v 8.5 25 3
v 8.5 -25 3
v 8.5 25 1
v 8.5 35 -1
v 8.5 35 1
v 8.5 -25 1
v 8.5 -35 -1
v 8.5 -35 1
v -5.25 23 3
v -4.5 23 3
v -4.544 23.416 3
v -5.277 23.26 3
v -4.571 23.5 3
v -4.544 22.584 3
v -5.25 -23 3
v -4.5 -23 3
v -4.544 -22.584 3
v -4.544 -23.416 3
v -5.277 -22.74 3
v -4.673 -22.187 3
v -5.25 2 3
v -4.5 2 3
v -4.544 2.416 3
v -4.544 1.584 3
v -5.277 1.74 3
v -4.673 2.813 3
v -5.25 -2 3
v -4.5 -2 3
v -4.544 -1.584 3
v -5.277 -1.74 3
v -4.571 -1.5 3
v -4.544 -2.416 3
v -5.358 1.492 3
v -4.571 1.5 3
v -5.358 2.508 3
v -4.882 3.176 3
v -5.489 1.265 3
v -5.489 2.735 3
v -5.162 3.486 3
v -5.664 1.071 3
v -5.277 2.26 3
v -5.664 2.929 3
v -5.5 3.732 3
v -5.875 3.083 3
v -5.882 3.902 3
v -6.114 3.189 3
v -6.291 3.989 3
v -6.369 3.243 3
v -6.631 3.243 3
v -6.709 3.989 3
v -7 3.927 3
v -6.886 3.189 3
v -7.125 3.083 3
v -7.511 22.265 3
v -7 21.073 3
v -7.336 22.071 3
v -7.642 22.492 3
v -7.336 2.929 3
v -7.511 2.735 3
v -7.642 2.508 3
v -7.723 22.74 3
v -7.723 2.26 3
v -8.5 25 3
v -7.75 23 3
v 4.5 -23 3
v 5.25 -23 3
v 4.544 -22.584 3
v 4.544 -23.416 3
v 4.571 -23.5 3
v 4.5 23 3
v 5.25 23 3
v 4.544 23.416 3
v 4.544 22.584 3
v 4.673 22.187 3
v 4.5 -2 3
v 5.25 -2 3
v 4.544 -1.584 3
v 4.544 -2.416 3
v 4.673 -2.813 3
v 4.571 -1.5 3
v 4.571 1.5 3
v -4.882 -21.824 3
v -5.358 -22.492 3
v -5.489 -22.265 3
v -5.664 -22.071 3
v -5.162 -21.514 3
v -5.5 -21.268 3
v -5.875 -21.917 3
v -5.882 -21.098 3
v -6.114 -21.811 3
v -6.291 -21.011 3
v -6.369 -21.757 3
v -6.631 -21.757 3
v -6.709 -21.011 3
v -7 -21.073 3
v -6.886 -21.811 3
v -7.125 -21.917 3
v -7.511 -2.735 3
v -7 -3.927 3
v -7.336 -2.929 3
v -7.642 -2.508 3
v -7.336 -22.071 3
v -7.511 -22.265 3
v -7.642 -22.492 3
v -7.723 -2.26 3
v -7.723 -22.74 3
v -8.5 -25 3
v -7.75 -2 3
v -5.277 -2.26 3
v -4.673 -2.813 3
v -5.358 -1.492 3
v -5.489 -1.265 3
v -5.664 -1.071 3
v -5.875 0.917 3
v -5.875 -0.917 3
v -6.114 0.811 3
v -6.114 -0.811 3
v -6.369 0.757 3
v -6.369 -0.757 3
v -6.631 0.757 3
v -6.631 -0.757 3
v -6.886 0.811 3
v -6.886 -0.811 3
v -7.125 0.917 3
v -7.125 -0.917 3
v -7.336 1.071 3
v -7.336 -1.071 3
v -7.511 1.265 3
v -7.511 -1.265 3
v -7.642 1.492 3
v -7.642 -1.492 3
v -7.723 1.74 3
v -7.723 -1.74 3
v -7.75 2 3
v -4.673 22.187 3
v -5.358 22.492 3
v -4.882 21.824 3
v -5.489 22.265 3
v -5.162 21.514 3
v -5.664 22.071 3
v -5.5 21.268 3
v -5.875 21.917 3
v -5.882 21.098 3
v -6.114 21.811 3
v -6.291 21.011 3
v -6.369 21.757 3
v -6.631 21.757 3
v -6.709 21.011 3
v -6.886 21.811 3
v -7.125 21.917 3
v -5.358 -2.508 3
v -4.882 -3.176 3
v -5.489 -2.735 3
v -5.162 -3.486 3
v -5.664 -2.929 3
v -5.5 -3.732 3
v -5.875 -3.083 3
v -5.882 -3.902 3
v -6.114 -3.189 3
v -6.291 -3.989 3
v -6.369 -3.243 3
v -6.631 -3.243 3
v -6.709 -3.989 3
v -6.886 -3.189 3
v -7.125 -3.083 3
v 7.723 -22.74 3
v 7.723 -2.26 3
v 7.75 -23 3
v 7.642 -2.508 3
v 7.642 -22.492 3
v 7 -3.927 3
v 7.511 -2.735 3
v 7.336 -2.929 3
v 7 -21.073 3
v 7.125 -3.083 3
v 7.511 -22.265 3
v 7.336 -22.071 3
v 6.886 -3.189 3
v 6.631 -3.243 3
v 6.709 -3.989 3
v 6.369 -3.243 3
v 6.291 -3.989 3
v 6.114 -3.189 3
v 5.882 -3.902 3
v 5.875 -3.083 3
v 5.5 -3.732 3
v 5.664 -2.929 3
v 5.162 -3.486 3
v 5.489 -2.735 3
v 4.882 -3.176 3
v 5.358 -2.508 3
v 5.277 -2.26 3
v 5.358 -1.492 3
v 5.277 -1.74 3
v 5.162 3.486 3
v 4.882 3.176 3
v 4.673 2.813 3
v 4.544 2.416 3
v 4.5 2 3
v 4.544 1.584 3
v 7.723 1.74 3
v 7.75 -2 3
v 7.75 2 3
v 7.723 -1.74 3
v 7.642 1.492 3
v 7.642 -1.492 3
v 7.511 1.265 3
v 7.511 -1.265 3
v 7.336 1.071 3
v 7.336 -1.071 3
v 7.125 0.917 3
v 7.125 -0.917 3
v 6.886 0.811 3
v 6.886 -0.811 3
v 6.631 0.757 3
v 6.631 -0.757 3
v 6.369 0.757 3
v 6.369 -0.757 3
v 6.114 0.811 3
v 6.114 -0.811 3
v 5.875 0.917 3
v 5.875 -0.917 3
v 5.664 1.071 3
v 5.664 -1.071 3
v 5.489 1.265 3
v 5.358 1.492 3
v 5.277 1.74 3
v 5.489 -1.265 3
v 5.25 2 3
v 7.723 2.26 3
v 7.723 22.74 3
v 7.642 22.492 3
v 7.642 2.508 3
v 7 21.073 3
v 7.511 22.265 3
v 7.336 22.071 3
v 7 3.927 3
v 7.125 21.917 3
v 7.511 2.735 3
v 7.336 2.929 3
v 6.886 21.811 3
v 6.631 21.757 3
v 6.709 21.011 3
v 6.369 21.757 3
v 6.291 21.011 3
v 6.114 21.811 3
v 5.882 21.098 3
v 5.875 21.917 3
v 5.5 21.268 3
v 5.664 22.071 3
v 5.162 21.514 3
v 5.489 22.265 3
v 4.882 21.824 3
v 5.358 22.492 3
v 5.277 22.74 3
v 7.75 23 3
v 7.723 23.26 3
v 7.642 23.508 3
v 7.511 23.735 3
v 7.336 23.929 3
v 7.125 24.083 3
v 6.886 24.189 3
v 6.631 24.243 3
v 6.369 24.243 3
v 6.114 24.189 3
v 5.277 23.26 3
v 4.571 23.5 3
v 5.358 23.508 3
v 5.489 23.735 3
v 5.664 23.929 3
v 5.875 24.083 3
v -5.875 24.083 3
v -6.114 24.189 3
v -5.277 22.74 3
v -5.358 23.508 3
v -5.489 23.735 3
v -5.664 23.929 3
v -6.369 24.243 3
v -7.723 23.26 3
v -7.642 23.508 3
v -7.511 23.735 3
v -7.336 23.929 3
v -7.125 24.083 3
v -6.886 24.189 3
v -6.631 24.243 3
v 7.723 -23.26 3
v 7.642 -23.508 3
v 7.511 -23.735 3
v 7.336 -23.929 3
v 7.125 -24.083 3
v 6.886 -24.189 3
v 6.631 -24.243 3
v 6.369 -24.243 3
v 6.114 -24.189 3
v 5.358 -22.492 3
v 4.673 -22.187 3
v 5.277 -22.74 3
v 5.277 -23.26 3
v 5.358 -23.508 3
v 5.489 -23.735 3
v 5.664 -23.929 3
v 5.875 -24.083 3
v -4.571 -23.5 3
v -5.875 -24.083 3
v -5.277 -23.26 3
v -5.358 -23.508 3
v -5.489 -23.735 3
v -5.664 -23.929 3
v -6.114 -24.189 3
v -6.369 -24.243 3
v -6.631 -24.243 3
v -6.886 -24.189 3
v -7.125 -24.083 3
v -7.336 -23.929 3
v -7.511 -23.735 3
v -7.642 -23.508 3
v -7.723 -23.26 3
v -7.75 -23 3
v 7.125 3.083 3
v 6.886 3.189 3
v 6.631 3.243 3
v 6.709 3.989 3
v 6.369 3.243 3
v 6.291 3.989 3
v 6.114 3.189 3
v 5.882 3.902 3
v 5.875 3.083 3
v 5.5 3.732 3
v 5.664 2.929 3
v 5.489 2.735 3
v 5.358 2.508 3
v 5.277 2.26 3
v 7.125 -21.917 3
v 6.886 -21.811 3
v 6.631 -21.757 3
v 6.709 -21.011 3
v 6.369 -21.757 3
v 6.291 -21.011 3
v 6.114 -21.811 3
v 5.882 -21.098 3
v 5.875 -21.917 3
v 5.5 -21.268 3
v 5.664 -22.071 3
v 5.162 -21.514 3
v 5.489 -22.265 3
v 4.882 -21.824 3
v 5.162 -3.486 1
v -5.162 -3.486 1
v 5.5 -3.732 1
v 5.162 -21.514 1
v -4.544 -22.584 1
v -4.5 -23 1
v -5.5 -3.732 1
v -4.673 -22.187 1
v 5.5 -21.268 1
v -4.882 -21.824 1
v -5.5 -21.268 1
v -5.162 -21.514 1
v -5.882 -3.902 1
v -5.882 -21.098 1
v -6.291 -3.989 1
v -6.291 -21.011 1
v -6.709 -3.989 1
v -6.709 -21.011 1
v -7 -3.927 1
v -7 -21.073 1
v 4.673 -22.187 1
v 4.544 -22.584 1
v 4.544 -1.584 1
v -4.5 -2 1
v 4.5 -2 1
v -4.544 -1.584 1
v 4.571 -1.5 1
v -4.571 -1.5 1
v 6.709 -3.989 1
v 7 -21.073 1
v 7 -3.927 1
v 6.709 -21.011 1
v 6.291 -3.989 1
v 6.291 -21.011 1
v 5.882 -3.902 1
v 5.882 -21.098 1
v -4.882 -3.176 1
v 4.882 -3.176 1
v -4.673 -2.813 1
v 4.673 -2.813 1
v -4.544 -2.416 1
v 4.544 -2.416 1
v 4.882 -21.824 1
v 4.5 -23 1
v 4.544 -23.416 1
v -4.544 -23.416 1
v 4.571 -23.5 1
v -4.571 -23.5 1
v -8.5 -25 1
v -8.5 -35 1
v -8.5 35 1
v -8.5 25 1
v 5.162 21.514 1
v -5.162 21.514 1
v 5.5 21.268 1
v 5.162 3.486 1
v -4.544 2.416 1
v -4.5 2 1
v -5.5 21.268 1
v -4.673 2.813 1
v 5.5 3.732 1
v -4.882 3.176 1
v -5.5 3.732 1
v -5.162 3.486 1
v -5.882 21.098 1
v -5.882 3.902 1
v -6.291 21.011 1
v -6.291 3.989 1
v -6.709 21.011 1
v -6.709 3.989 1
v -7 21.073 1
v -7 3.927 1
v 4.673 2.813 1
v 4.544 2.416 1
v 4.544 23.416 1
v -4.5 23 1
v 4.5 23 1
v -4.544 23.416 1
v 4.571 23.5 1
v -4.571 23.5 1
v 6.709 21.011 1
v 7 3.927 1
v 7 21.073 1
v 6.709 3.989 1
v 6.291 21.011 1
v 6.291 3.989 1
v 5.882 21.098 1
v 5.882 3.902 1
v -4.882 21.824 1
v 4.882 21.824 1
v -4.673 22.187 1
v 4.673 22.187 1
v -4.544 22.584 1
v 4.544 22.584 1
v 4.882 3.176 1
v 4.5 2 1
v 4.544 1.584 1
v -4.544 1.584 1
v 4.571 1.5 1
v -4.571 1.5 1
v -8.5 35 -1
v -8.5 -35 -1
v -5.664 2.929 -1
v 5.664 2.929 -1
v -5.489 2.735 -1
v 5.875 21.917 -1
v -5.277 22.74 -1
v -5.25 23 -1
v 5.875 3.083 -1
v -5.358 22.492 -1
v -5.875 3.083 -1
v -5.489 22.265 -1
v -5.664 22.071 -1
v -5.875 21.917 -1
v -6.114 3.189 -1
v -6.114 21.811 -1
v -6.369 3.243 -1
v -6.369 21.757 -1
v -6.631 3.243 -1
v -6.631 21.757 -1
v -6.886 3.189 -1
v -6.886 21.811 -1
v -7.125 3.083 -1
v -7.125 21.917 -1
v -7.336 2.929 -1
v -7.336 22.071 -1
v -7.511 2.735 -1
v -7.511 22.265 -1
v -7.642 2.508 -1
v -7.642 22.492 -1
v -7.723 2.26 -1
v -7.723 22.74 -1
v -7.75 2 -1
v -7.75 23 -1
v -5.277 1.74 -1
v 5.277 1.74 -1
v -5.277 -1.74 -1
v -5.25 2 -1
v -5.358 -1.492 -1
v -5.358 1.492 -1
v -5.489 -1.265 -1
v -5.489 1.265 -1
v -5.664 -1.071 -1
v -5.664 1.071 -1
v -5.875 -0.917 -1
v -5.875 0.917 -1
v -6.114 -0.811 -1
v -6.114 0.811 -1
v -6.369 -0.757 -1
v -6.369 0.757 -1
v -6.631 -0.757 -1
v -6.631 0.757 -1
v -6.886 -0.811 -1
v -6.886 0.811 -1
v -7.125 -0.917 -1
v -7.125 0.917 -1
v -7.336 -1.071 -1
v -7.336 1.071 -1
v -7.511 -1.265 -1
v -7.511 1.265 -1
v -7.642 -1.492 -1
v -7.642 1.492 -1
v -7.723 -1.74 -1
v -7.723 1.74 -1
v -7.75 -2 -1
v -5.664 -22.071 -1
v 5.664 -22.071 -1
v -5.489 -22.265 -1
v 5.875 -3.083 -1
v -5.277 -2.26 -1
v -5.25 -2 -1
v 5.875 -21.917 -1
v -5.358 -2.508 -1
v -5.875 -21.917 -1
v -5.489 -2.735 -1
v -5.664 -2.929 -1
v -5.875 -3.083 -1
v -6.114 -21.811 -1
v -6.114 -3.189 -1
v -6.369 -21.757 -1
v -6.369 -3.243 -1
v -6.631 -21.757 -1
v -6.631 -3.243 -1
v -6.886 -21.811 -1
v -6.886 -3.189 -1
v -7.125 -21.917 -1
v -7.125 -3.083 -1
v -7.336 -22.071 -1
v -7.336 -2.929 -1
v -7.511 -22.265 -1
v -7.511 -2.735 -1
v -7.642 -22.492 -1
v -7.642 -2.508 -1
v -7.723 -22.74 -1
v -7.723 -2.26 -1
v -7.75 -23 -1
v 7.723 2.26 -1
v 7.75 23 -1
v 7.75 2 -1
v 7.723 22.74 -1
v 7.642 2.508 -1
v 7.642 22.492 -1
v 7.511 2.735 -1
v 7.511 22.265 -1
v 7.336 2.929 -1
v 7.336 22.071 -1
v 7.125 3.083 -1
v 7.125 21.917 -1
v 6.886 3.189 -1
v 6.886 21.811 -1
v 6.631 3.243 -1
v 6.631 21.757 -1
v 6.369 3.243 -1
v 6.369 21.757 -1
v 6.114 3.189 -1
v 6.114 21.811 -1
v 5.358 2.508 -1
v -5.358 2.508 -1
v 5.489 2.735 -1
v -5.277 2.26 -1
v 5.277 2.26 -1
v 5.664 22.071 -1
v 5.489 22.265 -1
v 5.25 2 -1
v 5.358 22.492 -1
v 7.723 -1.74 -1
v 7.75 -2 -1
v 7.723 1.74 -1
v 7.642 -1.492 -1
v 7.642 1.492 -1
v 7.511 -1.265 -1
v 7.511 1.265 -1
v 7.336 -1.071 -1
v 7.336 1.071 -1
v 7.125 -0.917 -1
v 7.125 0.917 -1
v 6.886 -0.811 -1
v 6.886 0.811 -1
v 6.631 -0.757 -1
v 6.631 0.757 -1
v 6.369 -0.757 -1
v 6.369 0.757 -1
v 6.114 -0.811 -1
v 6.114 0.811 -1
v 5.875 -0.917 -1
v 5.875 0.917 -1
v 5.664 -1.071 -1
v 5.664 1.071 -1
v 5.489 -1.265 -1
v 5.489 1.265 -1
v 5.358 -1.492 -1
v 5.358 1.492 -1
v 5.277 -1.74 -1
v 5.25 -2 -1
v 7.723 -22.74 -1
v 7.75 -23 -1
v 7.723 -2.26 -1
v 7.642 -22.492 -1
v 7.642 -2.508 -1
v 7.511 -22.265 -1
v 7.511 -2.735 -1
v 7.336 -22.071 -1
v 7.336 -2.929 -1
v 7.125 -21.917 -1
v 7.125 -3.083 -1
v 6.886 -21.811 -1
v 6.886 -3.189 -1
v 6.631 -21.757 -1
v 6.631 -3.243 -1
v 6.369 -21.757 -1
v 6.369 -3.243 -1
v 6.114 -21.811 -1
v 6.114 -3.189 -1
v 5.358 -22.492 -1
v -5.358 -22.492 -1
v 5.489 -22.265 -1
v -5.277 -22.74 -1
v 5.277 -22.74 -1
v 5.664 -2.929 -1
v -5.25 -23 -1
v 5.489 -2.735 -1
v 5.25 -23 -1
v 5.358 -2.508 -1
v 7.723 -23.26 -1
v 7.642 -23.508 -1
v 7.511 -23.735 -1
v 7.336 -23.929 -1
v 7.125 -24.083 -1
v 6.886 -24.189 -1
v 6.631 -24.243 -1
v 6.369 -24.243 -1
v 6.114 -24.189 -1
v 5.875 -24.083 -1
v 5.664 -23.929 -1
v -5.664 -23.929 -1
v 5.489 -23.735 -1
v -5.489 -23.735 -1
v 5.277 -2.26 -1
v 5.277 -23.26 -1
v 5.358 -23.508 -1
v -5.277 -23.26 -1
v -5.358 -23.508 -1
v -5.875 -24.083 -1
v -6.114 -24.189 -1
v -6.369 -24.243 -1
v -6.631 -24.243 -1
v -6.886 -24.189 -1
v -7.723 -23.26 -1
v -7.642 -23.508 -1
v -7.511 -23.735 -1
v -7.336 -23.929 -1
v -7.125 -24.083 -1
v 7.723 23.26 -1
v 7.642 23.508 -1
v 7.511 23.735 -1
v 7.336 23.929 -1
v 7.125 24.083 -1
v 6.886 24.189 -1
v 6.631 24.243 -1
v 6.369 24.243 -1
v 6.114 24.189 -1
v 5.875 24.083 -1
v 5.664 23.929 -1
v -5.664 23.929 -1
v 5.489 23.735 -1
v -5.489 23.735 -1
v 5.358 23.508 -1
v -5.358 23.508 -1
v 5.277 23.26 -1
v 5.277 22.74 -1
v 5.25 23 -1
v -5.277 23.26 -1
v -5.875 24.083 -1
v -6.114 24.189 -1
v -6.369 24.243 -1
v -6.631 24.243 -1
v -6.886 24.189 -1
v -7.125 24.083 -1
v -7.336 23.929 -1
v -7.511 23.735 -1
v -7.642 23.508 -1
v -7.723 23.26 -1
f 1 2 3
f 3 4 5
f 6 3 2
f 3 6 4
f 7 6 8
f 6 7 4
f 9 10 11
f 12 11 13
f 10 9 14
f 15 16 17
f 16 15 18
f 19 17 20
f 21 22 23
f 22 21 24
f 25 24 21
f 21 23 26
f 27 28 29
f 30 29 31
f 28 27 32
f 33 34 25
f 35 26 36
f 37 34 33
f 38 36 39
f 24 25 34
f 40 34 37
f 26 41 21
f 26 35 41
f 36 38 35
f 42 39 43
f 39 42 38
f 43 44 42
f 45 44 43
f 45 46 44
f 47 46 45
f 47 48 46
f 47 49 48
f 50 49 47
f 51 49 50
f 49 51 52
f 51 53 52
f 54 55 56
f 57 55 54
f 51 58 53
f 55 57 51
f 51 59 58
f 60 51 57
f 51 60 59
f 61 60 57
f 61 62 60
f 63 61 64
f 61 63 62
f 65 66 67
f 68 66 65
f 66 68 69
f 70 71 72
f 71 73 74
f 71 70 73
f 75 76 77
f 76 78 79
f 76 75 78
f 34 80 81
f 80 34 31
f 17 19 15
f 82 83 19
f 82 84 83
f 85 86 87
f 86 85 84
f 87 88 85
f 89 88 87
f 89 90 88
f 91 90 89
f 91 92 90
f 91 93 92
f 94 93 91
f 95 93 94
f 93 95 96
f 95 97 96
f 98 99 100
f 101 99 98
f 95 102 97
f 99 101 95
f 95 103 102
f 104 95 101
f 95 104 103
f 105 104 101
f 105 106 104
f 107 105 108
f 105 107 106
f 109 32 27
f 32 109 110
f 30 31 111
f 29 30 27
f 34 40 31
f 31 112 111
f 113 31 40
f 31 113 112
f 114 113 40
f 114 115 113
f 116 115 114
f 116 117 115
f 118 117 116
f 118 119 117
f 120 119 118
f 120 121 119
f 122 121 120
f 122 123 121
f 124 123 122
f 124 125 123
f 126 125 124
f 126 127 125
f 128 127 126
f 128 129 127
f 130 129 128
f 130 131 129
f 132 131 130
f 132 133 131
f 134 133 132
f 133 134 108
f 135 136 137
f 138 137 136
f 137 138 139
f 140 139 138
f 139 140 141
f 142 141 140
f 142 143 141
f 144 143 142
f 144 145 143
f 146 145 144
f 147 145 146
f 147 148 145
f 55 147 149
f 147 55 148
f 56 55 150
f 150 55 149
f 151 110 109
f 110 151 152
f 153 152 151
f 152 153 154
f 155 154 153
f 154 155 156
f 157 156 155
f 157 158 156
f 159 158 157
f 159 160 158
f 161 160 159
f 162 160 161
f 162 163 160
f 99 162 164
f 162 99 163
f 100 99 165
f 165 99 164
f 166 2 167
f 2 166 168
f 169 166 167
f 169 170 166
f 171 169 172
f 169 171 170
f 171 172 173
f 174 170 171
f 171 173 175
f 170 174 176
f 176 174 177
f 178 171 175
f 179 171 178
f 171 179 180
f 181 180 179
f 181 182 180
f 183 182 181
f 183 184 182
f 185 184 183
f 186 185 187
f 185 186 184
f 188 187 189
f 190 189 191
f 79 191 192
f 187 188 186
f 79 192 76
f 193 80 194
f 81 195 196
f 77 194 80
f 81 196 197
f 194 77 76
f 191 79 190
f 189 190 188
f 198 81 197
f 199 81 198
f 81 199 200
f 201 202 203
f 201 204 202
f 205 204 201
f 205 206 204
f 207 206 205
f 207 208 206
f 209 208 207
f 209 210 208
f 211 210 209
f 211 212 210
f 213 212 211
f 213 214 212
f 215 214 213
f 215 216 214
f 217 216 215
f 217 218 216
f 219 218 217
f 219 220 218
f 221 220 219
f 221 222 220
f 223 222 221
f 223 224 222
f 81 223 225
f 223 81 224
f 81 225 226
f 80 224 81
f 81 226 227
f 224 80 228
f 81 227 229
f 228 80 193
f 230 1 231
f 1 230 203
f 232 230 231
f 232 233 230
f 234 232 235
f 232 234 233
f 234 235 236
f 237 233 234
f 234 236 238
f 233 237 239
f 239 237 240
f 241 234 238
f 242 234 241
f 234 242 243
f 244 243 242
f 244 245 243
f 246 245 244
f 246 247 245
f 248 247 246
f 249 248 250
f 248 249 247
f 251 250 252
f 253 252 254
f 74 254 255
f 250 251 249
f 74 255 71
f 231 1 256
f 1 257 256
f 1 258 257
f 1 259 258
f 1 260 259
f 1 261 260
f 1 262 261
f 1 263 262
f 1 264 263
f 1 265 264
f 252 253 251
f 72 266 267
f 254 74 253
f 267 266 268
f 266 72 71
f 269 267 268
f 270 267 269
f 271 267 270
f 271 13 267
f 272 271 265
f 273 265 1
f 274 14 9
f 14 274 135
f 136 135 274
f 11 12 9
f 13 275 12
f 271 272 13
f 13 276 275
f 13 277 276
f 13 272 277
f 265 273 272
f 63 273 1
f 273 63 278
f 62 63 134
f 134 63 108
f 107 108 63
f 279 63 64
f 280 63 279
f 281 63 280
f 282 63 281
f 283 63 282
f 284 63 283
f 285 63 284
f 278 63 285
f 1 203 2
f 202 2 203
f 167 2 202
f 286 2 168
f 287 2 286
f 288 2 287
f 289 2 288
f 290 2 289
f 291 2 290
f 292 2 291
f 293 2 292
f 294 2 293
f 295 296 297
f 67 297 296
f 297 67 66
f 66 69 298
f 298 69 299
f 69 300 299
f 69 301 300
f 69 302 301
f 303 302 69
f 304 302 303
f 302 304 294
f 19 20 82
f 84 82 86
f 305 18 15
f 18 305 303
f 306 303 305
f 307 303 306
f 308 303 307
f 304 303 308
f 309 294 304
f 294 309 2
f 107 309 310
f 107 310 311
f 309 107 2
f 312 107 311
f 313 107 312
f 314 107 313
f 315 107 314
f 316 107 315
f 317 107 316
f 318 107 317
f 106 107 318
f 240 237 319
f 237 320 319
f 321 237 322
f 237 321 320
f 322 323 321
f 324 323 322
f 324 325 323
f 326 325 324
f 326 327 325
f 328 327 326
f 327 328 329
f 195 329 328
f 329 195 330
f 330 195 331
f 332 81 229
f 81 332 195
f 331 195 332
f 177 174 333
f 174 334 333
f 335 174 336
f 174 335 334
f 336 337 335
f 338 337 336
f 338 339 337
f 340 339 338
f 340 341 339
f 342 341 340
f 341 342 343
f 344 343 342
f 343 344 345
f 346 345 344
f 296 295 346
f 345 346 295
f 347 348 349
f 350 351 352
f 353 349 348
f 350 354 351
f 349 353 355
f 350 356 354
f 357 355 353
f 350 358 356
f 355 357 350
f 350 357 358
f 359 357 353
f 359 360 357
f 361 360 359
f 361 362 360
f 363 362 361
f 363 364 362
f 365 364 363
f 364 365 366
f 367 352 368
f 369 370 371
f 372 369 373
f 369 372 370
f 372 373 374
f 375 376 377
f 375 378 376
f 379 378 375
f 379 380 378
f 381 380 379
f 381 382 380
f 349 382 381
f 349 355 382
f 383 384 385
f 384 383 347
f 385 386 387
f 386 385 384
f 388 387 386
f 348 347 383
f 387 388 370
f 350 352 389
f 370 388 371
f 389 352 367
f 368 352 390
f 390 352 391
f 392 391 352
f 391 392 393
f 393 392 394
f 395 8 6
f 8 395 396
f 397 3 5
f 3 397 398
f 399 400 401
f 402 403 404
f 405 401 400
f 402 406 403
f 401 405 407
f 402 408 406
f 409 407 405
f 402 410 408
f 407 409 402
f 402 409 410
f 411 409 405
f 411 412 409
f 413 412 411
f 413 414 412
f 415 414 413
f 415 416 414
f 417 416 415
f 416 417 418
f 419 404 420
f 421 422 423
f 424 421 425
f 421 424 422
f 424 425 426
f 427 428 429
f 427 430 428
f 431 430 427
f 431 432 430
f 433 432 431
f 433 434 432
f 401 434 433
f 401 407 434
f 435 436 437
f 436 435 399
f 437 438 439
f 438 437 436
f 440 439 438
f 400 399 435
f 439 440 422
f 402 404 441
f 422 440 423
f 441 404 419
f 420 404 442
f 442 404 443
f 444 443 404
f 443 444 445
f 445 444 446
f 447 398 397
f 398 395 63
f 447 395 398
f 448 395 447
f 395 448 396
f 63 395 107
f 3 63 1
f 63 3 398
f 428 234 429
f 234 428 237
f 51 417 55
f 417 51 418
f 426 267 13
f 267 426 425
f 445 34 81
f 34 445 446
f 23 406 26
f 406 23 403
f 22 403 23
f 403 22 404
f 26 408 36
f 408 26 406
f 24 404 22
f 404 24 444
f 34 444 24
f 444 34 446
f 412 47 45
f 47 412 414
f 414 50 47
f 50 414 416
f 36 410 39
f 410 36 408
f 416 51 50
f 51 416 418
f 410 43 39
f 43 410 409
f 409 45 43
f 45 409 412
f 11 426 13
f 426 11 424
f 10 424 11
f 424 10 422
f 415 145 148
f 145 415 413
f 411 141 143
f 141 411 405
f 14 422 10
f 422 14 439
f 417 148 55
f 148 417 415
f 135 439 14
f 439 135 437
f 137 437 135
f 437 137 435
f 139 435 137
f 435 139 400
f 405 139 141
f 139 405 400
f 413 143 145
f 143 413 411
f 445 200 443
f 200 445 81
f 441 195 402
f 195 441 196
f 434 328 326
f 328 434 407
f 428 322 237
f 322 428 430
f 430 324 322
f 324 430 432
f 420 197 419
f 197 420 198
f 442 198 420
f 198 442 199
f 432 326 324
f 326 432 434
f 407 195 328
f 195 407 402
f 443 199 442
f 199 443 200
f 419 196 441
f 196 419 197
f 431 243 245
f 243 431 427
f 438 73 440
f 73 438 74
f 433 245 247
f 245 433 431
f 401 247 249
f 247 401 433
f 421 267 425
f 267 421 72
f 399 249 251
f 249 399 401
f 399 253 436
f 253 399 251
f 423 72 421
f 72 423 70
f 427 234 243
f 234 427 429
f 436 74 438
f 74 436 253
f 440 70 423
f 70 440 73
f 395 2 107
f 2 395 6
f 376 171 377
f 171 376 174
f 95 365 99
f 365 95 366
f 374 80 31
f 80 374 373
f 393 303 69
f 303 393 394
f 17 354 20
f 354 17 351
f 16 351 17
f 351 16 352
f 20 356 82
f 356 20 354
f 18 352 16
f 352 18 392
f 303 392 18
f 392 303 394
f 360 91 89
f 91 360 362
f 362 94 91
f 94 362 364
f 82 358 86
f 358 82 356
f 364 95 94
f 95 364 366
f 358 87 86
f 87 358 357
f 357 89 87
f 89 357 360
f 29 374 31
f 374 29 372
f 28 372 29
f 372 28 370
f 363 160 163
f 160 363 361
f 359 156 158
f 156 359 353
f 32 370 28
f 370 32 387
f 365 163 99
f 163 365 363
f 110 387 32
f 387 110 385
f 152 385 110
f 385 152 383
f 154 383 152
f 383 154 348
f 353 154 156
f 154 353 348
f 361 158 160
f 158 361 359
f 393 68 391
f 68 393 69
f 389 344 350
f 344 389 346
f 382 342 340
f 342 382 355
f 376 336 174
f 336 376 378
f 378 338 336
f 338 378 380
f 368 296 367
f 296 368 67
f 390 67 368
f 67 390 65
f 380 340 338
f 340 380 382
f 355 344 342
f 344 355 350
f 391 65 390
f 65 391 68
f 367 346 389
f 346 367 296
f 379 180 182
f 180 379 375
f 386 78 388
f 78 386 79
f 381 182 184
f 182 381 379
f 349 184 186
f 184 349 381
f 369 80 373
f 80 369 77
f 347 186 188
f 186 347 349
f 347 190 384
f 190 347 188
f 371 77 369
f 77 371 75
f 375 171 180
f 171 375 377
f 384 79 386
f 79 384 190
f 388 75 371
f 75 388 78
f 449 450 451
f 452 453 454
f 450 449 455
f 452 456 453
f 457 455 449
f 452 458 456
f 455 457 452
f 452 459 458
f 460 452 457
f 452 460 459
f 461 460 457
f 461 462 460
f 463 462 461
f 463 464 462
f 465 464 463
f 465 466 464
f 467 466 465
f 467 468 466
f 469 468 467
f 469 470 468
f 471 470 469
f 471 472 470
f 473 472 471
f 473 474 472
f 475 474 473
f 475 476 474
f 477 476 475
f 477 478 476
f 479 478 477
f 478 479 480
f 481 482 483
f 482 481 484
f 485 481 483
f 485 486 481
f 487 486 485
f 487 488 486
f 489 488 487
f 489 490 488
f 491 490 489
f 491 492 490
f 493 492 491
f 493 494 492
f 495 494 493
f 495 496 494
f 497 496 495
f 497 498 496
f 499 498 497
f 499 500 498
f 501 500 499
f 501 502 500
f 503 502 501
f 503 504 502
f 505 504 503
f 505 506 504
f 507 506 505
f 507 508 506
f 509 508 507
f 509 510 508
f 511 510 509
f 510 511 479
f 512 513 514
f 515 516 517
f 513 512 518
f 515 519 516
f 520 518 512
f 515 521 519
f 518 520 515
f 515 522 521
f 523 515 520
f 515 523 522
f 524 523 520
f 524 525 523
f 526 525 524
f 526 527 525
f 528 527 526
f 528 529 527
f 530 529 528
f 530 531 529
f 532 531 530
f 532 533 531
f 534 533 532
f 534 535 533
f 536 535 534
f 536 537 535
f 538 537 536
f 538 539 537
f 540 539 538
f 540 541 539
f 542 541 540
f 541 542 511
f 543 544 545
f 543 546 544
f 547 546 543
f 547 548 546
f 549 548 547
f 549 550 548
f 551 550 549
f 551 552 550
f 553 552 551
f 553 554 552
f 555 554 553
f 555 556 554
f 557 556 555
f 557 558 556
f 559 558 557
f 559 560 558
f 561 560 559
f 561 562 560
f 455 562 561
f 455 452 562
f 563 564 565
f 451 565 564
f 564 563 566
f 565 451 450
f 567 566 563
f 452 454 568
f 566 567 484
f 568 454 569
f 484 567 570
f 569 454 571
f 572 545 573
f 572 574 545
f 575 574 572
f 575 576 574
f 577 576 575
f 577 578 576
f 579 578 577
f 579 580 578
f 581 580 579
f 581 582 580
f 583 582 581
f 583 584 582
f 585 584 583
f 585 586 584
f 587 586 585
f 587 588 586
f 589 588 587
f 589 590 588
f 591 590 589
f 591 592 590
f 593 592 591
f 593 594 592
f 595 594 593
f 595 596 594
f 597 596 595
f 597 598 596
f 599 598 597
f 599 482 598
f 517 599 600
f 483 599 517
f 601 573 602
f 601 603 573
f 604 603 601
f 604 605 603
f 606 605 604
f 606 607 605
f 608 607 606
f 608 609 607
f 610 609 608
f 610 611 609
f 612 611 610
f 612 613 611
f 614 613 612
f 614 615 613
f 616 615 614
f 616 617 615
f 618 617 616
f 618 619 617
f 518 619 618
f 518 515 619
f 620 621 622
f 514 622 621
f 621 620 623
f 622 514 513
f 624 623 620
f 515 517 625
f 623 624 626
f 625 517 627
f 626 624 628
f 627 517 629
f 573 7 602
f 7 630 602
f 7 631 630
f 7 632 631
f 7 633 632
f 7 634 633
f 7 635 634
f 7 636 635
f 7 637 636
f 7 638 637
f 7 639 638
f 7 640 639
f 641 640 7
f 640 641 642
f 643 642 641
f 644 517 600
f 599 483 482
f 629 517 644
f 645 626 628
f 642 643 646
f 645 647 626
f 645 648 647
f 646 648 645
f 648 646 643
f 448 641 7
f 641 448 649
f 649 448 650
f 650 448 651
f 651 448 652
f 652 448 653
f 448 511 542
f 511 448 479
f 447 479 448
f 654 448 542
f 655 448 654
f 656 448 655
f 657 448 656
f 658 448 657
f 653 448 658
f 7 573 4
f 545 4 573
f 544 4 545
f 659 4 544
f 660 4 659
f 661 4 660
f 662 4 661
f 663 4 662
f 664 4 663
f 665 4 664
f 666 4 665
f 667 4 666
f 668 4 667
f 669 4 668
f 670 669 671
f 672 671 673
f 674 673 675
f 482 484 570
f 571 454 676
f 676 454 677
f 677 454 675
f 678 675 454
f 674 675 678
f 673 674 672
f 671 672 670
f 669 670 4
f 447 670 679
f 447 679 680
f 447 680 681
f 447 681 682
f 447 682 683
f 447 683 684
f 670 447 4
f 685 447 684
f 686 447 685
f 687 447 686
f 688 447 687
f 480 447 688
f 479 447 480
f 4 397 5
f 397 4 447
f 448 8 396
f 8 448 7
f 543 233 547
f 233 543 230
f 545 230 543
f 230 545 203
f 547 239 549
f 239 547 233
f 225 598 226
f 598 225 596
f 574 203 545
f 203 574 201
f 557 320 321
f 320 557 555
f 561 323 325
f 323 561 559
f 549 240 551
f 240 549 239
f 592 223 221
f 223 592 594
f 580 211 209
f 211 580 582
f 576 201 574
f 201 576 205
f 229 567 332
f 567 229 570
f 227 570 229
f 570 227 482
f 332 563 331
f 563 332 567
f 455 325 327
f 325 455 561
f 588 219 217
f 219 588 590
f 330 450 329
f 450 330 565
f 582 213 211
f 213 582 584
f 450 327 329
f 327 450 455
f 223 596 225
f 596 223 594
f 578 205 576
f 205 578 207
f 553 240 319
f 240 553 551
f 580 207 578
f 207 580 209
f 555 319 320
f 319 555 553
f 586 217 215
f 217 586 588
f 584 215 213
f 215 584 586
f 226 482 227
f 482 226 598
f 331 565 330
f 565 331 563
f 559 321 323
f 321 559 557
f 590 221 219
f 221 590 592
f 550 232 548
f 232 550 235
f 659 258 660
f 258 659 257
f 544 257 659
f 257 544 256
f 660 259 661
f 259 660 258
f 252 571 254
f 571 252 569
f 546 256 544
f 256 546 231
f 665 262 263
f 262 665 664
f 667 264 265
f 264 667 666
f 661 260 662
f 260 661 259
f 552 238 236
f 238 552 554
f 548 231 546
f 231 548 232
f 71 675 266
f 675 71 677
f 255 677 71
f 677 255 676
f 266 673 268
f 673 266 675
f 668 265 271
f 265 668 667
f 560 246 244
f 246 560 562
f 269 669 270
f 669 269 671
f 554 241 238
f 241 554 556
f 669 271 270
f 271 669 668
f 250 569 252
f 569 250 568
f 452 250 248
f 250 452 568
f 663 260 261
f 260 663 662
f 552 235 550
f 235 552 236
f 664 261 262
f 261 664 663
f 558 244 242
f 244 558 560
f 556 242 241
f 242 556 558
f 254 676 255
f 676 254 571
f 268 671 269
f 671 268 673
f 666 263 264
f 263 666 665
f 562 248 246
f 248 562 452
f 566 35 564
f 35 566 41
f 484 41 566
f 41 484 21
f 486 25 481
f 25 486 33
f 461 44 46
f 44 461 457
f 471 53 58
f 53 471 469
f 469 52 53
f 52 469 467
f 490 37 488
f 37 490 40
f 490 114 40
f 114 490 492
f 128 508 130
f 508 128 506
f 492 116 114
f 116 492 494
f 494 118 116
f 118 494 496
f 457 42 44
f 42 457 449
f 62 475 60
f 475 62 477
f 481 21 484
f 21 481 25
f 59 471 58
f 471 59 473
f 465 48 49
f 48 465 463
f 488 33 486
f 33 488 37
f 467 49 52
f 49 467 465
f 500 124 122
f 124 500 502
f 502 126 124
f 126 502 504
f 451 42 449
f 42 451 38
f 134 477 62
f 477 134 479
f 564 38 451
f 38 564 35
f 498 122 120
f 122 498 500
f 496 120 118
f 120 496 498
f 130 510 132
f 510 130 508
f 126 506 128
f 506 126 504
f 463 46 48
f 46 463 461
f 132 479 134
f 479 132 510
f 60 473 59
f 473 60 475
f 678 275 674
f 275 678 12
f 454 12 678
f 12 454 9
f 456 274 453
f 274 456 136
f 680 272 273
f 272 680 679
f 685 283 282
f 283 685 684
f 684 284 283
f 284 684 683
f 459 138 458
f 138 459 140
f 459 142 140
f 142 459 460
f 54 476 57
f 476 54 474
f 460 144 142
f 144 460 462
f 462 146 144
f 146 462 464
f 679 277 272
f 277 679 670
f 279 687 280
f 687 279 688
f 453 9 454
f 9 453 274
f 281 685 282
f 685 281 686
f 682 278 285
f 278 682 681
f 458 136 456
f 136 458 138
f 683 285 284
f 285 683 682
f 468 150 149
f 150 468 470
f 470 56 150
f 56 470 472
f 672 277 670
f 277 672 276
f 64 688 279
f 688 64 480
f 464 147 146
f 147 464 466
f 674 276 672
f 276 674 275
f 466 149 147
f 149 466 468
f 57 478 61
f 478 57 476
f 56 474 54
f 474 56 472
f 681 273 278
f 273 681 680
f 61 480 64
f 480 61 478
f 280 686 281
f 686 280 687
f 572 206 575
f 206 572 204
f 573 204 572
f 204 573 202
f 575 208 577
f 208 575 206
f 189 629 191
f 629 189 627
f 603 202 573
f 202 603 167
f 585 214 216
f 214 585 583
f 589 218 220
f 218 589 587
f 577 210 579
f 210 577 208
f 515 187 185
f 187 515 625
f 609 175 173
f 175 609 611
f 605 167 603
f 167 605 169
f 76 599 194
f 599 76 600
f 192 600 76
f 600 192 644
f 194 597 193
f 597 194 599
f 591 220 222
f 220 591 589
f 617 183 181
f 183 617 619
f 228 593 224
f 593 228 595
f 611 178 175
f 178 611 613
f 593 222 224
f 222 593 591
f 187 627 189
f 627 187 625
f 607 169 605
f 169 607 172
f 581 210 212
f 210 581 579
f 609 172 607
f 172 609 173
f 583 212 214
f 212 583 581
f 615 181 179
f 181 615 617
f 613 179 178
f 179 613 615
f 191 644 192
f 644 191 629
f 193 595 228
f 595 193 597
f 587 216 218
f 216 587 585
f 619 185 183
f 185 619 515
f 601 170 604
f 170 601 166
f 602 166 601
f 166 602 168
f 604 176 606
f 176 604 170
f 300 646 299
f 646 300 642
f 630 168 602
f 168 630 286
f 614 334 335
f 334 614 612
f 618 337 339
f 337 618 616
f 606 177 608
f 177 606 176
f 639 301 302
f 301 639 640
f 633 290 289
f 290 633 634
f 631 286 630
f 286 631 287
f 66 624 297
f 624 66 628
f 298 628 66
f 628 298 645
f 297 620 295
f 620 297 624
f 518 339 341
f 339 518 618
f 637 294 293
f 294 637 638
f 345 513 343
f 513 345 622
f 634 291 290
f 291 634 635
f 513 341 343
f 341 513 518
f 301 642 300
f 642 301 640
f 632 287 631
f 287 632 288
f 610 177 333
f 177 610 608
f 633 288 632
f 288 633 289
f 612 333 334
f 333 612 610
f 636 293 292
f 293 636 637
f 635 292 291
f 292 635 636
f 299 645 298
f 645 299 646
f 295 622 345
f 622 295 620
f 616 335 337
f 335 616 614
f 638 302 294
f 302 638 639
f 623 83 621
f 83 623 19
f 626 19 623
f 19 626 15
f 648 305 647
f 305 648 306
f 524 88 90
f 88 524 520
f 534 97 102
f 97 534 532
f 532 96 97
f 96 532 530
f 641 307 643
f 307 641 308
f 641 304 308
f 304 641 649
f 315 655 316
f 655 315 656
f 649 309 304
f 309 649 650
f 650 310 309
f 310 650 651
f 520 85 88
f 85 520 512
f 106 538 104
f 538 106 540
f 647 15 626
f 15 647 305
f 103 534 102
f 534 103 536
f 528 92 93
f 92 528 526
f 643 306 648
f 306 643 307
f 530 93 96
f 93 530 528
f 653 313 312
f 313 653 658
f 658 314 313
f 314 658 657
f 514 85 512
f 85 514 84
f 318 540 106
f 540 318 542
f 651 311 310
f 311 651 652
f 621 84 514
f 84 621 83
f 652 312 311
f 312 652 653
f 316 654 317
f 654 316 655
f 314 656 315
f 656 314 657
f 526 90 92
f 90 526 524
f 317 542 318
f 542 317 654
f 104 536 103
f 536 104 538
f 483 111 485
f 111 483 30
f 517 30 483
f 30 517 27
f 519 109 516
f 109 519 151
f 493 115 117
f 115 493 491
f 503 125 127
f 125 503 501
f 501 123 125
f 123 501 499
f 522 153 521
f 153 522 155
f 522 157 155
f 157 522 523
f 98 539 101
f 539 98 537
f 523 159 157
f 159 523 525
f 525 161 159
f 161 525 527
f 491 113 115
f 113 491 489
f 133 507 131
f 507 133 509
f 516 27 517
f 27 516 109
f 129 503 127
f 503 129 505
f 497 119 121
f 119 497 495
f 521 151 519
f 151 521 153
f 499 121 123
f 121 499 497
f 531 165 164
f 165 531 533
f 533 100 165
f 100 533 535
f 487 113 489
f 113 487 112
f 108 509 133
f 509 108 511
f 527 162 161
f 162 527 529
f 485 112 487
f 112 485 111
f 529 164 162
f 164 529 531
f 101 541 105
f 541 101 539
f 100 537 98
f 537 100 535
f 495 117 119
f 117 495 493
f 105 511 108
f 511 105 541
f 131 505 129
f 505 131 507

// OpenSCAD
module screwsupport() {
    cylinder(d=4, h=2, $fn=30);
}
module screwhole() {
    cylinder(d=2.5, h=13, $fn=30);
}

module back() {
    union() {
        difference() {
            cube([17, 25, 2]);
            translate([1.5, 1.5, 0])
                cube([14, 22, 2]);
        }
        translate([2, 2, 0])
            screwsupport();
      
        translate([2, 23, 0])
            screwsupport();

        translate([15, 2, 0])
            screwsupport();

        translate([15, 23, 0])
            screwsupport();
    }
}
 
difference() {
    union (){
        cube([17, 70, 2], center=true);
        translate([-8.5, 0, 1])
            back();

        translate([-8.5, -25, 1])
            back();
    }

    translate([6.5, 2, -2])
        screwhole();

    translate([6.5, 23, -2])
        screwhole();

    translate([-6.5, 2, -2])
        screwhole();

    translate([-6.5, 23, -2])
        screwhole();

    translate([6.5, -2, -2])
        screwhole();

    translate([6.5, -23, -2])
        screwhole();

    translate([-6.5, -23, -2])
        screwhole();

    translate([-6.5, -2, -2])
        screwhole();
}
